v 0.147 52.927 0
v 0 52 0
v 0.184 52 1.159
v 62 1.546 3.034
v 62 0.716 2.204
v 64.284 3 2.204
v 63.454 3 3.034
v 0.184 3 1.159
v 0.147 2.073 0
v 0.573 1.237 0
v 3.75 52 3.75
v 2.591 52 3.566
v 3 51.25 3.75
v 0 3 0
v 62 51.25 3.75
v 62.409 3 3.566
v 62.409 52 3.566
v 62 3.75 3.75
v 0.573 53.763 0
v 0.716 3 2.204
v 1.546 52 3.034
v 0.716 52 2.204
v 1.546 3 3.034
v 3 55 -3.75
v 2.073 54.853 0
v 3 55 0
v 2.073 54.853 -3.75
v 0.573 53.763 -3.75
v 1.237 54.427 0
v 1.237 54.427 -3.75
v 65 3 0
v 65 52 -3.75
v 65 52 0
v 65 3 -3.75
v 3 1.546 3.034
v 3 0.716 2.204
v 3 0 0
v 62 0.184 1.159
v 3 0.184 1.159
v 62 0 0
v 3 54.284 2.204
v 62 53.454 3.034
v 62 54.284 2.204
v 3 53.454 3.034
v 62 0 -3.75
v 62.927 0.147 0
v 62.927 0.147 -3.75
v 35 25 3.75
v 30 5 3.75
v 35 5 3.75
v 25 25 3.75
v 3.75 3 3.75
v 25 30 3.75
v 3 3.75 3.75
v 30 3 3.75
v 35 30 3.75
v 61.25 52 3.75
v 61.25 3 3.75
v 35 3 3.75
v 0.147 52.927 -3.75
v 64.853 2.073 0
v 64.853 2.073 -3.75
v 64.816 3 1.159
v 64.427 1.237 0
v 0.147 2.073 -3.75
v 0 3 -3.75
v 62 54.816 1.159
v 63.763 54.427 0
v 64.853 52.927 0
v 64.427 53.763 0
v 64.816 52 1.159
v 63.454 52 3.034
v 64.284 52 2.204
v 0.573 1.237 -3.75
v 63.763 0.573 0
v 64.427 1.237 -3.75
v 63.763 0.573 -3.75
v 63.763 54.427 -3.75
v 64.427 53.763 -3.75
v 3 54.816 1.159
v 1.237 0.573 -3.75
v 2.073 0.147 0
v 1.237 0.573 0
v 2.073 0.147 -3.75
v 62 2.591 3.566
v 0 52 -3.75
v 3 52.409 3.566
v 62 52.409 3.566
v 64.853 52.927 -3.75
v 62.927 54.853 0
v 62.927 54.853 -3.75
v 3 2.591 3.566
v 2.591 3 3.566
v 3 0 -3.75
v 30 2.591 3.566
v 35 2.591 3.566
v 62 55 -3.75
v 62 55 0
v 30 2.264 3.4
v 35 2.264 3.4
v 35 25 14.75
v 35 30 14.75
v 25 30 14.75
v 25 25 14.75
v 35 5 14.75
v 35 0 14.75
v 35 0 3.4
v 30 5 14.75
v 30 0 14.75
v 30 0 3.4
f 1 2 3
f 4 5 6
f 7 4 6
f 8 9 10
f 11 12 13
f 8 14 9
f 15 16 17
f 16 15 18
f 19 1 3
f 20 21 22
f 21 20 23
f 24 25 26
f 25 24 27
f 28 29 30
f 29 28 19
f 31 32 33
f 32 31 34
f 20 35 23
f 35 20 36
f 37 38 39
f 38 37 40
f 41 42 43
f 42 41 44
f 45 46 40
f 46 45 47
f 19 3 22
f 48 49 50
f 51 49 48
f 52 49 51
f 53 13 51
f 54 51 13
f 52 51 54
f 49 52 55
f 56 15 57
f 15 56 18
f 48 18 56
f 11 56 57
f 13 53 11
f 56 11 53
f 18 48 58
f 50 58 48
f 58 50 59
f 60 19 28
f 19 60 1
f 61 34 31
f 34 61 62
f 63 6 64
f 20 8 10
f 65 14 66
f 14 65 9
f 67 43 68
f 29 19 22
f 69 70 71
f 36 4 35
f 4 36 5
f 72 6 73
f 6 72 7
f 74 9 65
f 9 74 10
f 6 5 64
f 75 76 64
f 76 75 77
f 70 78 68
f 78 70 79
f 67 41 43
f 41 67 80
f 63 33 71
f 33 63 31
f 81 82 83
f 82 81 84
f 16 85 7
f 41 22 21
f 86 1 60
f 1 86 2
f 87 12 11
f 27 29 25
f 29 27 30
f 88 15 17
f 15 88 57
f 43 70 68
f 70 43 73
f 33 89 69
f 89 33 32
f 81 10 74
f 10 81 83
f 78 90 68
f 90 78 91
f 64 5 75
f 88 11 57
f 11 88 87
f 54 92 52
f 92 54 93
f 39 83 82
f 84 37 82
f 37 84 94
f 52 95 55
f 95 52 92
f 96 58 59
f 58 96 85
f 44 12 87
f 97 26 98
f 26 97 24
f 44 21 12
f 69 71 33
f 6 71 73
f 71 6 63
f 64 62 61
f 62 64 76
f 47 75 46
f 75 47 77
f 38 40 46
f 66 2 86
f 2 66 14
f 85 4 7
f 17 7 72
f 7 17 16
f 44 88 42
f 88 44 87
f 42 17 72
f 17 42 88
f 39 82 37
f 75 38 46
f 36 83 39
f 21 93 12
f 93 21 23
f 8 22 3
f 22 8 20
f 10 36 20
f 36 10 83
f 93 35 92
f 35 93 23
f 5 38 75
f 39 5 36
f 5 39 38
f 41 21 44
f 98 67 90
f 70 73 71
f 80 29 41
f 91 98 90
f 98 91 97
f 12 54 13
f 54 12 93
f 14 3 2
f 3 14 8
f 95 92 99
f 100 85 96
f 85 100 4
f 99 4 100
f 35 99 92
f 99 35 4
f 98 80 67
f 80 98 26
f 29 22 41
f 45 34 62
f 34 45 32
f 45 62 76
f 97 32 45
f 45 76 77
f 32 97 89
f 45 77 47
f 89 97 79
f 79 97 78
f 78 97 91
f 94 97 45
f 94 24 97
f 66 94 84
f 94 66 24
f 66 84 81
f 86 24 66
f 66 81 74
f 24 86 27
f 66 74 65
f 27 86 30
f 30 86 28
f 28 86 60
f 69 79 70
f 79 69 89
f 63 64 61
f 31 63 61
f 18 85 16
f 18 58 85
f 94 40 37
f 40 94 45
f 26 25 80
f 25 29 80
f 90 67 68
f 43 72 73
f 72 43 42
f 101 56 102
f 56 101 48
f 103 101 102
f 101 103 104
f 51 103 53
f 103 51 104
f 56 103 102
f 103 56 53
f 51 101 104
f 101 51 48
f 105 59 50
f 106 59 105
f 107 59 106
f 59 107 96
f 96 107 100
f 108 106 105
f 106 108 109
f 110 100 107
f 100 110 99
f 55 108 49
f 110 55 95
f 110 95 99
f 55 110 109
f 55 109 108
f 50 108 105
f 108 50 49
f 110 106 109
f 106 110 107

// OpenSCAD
//FootLeft

//variables
xRectangle = 65;
yRectangle = 55;
zRectangle = 7.5;

xBigRectangle = 10;
yBigRectangle = 5;
zBigRectangle = 11;

xSmallRectangle = 5;
ySmallRectangle = 5;
zSmallRectangleLong = 11.35;
zSmallRectangleShort = 11;

angleRadius = 3;

nFaces=20;

//modules
module bigRectangle(){
    cube([xBigRectangle, yBigRectangle, zBigRectangle]);
}

module smallRectangle(){
    cube([xSmallRectangle, ySmallRectangle, zSmallRectangleLong]);
}

module base(){
      hull(){
        //atras
        translate([zRectangle/2,angleRadius,0])
            rotate([270,90,0])
                cylinder(h=yRectangle-2*angleRadius, d=zRectangle, $fn=20);
    
        //alante
        translate([xRectangle-zRectangle/2,angleRadius,0])
            rotate([270,90,0])
                cylinder(h=yRectangle-2*angleRadius, d=zRectangle, $fn=20);
    
        //izqda
        translate([angleRadius,zRectangle/2,0])
            rotate([0,90,0])
                cylinder(h=xRectangle-2*angleRadius, d=zRectangle, $fn=20);
        
        //dcha
        translate([angleRadius,yRectangle-zRectangle/2,0])
            rotate([0,90,0])
                cylinder(h=xRectangle-2*angleRadius, d=zRectangle, $fn=20);
        
        //esquinas
        translate([angleRadius, angleRadius, -zRectangle/2])
            cylinder(h=zRectangle/2,d=angleRadius*2, $fn=20);
        translate([xRectangle-angleRadius, angleRadius, -zRectangle/2])
            cylinder(h=zRectangle/2,d=angleRadius*2, $fn=20);
        translate([angleRadius, yRectangle-angleRadius, -zRectangle/2])
            cylinder(h=zRectangle/2,d=angleRadius*2, $fn=20);
        translate([xRectangle-angleRadius, yRectangle-angleRadius, -zRectangle/2])
            cylinder(h=zRectangle/2,d=angleRadius*2, $fn=20);
    }
}

module footLeft(){
    union(){
        base();
        
        translate([xRectangle/2-xSmallRectangle*1.5,yRectangle/2-yBigRectangle/2,zRectangle/2])
        bigRectangle();
        
        translate([xRectangle/2-xSmallRectangle/2,0,zRectangle/2-(zSmallRectangleLong-zSmallRectangleShort)])
        smallRectangle();
    }
}

footLeft();
